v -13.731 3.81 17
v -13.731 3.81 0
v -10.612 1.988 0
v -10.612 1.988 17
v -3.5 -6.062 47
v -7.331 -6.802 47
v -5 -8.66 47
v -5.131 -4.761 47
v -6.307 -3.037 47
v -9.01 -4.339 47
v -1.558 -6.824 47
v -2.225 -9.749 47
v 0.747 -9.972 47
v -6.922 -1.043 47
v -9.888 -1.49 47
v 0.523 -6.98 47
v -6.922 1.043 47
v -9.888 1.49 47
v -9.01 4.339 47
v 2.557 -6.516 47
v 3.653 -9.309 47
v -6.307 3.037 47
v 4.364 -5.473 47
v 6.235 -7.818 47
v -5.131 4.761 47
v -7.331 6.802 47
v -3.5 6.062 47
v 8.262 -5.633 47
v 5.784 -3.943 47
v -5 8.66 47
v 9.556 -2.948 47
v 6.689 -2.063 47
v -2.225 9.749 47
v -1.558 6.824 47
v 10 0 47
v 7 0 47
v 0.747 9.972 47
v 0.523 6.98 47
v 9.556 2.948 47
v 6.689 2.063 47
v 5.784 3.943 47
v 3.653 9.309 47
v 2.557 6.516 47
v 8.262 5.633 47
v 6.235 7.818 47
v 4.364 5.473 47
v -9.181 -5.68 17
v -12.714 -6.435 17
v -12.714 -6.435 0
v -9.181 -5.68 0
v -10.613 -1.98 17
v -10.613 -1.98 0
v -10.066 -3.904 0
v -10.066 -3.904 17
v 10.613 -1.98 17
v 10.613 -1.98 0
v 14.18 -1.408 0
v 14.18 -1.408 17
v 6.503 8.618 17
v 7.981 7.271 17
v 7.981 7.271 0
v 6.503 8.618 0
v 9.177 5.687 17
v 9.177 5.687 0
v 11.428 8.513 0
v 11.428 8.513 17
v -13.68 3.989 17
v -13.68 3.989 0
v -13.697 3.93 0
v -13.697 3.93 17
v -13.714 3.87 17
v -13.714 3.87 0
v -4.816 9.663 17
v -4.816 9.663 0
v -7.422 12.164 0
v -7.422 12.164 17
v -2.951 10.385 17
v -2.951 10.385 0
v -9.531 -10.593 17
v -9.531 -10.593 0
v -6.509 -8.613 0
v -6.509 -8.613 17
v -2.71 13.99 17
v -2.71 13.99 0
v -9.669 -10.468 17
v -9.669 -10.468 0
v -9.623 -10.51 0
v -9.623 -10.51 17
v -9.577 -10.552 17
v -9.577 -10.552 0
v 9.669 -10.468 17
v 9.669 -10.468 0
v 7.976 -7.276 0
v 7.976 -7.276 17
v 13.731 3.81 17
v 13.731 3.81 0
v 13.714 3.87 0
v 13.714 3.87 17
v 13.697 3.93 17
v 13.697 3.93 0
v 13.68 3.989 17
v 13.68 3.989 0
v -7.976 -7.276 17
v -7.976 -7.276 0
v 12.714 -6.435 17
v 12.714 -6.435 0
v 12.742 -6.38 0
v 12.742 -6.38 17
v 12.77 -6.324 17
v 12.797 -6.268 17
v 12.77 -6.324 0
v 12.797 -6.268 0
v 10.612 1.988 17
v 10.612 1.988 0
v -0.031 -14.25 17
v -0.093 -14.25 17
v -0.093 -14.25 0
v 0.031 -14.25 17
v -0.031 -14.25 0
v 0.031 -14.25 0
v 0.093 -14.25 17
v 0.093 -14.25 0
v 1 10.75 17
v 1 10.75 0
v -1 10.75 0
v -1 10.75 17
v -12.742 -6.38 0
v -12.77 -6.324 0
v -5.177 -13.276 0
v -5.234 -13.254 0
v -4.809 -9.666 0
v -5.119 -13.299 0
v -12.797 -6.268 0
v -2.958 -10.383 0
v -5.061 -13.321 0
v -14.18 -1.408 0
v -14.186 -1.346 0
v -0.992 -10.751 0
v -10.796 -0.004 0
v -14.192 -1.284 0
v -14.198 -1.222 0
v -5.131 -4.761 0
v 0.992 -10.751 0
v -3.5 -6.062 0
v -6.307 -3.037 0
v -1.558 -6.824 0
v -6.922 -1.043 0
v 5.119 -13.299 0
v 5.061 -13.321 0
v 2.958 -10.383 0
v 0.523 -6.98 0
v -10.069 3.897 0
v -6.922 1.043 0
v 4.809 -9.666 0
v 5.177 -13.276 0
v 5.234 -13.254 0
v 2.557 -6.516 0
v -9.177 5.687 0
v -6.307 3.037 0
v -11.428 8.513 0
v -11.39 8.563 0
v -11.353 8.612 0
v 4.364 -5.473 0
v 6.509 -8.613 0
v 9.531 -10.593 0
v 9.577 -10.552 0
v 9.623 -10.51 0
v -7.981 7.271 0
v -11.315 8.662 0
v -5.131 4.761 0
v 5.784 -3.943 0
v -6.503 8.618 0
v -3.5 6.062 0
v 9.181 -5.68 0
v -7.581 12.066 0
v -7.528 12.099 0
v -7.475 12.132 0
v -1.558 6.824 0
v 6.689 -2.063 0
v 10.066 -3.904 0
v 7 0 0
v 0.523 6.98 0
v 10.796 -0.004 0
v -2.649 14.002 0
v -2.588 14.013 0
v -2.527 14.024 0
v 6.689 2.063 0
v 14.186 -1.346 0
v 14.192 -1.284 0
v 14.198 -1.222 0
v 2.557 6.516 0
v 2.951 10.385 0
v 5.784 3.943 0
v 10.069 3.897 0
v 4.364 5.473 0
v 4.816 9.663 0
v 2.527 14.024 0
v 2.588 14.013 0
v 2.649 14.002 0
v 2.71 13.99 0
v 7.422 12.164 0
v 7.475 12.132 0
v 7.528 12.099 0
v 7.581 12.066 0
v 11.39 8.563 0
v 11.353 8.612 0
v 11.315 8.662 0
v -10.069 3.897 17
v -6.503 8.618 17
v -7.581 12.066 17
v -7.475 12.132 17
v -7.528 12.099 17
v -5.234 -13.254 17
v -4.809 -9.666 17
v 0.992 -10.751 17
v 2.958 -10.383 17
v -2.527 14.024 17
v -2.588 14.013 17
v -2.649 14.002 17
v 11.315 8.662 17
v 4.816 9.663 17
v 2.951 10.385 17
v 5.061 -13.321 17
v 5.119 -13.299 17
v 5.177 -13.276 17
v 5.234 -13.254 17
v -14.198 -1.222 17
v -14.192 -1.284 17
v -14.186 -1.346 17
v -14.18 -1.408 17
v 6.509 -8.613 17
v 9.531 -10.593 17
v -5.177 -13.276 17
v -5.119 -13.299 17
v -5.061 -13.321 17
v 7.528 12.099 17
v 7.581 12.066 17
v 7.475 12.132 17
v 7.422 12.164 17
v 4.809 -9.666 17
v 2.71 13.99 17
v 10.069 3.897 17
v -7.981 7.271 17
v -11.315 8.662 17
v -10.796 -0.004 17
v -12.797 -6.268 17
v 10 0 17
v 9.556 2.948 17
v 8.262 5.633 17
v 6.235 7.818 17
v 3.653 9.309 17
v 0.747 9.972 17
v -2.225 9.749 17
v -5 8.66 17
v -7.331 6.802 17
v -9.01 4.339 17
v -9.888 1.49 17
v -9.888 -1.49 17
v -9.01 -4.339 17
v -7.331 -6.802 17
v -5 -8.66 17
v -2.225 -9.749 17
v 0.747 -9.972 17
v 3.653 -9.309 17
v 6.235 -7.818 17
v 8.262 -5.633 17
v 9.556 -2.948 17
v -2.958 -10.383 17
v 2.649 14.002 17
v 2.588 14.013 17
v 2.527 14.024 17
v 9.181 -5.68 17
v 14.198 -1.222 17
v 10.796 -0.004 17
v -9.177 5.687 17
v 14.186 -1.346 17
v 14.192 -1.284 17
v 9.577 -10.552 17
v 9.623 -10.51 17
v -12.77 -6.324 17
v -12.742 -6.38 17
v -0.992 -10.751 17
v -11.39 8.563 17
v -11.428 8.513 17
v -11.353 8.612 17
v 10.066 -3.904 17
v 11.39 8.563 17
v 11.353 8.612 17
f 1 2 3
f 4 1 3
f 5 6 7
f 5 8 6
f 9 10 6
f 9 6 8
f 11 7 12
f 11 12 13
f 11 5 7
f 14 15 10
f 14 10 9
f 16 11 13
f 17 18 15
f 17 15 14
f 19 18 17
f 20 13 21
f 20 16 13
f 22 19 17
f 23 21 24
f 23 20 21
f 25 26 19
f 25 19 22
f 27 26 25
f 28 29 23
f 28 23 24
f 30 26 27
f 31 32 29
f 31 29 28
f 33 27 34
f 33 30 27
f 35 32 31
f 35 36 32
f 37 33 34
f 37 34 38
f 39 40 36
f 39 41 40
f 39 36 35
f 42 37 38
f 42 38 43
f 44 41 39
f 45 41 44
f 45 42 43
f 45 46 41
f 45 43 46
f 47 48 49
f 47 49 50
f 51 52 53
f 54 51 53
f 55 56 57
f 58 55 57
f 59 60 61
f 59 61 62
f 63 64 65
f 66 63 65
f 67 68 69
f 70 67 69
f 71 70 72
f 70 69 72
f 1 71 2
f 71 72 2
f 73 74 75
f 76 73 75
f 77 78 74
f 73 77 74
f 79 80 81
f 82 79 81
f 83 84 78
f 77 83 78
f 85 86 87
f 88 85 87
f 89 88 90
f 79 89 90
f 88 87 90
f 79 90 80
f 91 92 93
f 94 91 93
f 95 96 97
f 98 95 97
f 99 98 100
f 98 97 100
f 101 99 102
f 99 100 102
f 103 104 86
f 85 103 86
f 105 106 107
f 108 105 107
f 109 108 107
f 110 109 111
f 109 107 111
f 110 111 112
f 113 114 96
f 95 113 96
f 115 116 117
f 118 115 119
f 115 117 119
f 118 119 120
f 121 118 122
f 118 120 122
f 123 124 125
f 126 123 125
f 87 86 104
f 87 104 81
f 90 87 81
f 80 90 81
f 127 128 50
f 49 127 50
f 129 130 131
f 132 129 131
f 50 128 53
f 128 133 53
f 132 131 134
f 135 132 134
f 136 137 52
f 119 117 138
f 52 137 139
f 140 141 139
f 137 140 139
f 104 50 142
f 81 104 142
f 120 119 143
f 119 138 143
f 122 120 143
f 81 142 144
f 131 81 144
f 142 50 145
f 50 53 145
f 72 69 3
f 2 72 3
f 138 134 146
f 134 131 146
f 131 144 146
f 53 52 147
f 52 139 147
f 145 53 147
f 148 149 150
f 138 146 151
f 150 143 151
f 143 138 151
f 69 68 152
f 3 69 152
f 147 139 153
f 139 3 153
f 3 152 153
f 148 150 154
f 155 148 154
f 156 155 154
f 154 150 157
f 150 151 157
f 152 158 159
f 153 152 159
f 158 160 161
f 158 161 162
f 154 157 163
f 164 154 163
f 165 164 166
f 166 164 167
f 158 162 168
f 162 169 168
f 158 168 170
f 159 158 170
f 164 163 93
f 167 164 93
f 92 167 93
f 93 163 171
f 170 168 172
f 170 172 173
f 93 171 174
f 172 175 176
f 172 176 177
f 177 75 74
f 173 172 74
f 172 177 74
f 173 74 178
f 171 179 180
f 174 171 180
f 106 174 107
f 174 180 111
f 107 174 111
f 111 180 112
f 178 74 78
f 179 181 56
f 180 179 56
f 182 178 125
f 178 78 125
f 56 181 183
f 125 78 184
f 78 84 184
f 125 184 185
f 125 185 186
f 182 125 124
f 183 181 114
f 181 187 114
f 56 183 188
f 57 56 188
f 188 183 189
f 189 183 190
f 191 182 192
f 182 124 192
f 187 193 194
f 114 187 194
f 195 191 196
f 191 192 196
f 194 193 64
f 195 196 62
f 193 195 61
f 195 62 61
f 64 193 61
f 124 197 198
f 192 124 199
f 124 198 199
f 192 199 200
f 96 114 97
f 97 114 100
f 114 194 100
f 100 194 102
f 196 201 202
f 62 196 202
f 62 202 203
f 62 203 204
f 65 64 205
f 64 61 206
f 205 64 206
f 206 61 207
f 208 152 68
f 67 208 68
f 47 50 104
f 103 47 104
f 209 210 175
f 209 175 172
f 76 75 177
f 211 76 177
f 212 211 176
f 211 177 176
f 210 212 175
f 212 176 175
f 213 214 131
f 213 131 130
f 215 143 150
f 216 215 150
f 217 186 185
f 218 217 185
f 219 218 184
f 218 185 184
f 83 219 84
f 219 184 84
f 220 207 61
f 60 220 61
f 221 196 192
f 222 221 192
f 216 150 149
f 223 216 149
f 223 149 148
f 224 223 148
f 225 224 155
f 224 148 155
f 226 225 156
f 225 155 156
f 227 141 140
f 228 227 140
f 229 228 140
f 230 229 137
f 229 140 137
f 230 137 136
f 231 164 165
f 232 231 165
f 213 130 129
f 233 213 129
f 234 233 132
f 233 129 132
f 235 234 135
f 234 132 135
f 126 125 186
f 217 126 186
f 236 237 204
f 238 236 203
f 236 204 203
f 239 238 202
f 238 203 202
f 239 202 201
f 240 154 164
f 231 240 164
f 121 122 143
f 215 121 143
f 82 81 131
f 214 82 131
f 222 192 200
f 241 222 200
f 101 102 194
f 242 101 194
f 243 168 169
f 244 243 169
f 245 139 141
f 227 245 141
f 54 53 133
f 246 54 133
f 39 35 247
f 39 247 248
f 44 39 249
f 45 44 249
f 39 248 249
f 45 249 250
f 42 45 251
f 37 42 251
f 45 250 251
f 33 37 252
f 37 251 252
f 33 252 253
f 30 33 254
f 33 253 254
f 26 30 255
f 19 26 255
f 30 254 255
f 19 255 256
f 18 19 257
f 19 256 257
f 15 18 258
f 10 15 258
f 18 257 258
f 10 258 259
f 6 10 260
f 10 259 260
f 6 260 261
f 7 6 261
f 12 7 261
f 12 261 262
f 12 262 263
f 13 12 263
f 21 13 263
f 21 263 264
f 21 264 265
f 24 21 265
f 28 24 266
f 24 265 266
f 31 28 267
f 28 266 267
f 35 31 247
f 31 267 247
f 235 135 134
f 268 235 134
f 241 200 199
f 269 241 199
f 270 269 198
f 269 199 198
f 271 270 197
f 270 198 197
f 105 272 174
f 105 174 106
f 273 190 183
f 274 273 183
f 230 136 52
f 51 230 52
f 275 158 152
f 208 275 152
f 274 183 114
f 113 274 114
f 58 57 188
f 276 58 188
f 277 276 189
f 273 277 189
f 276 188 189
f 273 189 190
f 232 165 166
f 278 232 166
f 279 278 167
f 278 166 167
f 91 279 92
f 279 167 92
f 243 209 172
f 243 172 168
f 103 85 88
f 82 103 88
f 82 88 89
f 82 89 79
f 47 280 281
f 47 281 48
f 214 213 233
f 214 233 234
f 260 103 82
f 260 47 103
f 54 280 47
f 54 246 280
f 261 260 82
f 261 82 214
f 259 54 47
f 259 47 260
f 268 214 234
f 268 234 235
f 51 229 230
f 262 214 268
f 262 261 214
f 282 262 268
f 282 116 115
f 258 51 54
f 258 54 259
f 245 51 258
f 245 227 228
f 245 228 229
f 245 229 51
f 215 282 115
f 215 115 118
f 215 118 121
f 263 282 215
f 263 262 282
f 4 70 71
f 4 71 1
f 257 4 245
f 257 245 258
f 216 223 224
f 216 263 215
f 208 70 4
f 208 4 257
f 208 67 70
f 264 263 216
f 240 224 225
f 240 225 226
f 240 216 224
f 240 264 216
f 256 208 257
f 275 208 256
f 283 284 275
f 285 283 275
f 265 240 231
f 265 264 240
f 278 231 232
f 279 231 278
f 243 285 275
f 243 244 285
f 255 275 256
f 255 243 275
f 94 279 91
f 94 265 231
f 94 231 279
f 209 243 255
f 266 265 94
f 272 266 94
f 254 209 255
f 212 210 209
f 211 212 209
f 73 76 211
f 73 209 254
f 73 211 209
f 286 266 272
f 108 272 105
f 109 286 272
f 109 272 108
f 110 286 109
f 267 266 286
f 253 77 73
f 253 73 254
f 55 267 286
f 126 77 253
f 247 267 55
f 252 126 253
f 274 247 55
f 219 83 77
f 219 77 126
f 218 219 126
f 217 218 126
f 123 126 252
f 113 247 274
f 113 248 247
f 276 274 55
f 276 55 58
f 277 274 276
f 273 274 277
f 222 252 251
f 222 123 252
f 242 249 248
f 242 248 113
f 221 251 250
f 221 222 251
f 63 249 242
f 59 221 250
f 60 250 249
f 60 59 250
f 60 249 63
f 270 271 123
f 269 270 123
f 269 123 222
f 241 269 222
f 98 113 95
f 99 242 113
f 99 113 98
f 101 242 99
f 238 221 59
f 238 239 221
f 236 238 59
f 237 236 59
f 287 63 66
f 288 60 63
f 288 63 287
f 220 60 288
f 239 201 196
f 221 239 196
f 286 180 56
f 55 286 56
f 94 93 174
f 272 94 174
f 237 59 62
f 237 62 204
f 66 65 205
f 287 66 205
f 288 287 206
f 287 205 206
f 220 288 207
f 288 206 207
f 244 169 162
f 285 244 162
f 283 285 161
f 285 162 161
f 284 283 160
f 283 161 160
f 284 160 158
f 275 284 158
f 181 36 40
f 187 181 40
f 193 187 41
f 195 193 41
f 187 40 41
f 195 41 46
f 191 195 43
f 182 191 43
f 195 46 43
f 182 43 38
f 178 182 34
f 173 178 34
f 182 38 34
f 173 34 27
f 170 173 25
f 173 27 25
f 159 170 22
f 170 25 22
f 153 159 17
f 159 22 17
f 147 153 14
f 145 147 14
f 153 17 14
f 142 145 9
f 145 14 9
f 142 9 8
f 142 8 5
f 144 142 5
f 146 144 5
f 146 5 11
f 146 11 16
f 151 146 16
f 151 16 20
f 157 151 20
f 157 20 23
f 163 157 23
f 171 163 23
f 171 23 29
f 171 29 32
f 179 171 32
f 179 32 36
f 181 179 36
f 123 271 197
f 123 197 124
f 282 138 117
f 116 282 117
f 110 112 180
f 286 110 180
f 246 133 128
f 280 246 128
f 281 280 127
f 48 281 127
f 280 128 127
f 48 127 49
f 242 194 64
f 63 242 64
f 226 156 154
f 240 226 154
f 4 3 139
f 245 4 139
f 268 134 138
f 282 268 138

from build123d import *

# Parameters (mm, degrees)
SKETCH_1_R          = 14.25
EXTRUDE_1_DEPTH     = 17
SKETCH_2_R          = 10
EXTRUDE_2_DEPTH     = 30
CUT_EXTRUDE_1_DEPTH = 52.138292893
SKETCH_4_R          = 7
CUT_EXTRUDE_2_DEPTH = 52.123690078


with BuildPart() as part:
    # 草图1 → 拉伸1 (new body)
    with BuildSketch(Plane.XY):
        Circle(SKETCH_1_R)
    extrude(amount=EXTRUDE_1_DEPTH)

    # 草图2 → 拉伸2 (add)
    with BuildSketch(Plane.XY.offset(17)):
        Circle(SKETCH_2_R)
    extrude(amount=EXTRUDE_2_DEPTH)

    # 草图3 → 切除-拉伸1 (cut, through all)
    with BuildSketch(Plane(origin=(0, 0, 0), x_dir=(-1, 0, 0), z_dir=(0, 0, -1))):
        with BuildLine():
            Line((2.950875682, 10.385318132), (4.815820141, 9.6628348))
            Line((4.815820141, 9.6628348), (7.422273255, 12.164388999))
            ThreePointArc((7.422273255, 12.164388999), (5.147693743, 13.287729269), (2.709969755, 13.989945101))
            Line((2.709969755, 13.989945101), (2.950875682, 10.385318132))
        make_face()
        with BuildLine():
            Line((-1, 10.75), (1, 10.75))
            Line((1, 10.75), (2.526779539, 14.024189287))
            ThreePointArc((2.526779539, 14.024189287), (0, 14.25), (-2.526779539, 14.024189287))
            Line((-2.526779539, 14.024189287), (-1, 10.75))
        make_face()
        with BuildLine():
            Line((6.503219252, 8.618041504), (7.981237086, 7.270650216))
            Line((7.981237086, 7.270650216), (11.315347839, 8.661720572))
            ThreePointArc((11.315347839, 8.661720572), (9.600162922, 10.53087707), (7.580722617, 12.066281308))
            Line((7.580722617, 12.066281308), (6.503219252, 8.618041504))
        make_face()
        with BuildLine():
            Line((9.177267026, 5.686850616), (10.068743738, 3.896524033))
            Line((10.068743738, 3.896524033), (13.680221998, 3.989238785))
            ThreePointArc((13.680221998, 3.989238785), (12.756076902, 6.35177157), (11.427656884, 8.512999362))
            Line((11.427656884, 8.512999362), (9.177267026, 5.686850616))
        make_face()
        with BuildLine():
            Line((10.611874036, 1.987619041), (10.796410755, -0.003849312))
            Line((10.796410755, -0.003849312), (14.197506371, -1.222011804))
            ThreePointArc((14.197506371, -1.222011804), (14.189212012, 1.314824122), (13.731222765, 3.809989681))
            Line((13.731222765, 3.809989681), (10.611874036, 1.987619041))
        make_face()
        with BuildLine():
            Line((10.613288654, -1.9800515), (10.065962674, -3.903702786))
            Line((10.065962674, -3.903702786), (12.797338837, -6.268222929))
            ThreePointArc((12.797338837, -6.268222929), (13.706015415, -3.899697609), (14.180310925, -1.407580219))
            Line((14.180310925, -1.407580219), (10.613288654, -1.9800515))
        make_face()
        with BuildLine():
            Line((9.18131983, -5.680305114), (7.976050557, -7.276339568))
            Line((7.976050557, -7.276339568), (9.668819781, -10.467875813))
            ThreePointArc((9.668819781, -10.467875813), (11.371745489, -8.587543568), (12.714269518, -6.43504861))
            Line((12.714269518, -6.43504861), (9.18131983, -5.680305114))
        make_face()
        with BuildLine():
            Line((6.509362887, -8.613402046), (4.808928615, -9.666266372))
            Line((4.808928615, -9.666266372), (5.234473037, -13.253784064))
            ThreePointArc((5.234473037, -13.253784064), (7.501658321, -12.115594184), (9.531095561, -10.593428029))
            Line((9.531095561, -10.593428029), (6.509362887, -8.613402046))
        make_face()
        with BuildLine():
            Line((2.958280416, -10.383211304), (0.992334217, -10.750710339))
            Line((0.992334217, -10.750710339), (0.093181704, -14.249695336))
            ThreePointArc((0.093181704, -14.249695336), (2.618430629, -14.00736667), (5.060694335, -13.321106292))
            Line((5.060694335, -13.321106292), (2.958280416, -10.383211304))
        make_face()
        with BuildLine():
            Line((-0.992334217, -10.750710339), (-2.958280416, -10.383211304))
            Line((-2.958280416, -10.383211304), (-5.060694335, -13.321106292))
            ThreePointArc((-5.060694335, -13.321106292), (-2.618430629, -14.00736667), (-0.093181704, -14.249695336))
            Line((-0.093181704, -14.249695336), (-0.992334217, -10.750710339))
        make_face()
        with BuildLine():
            Line((-4.808928615, -9.666266372), (-6.509362887, -8.613402046))
            Line((-6.509362887, -8.613402046), (-9.531095561, -10.593428029))
            ThreePointArc((-9.531095561, -10.593428029), (-7.501658321, -12.115594184), (-5.234473037, -13.253784064))
            Line((-5.234473037, -13.253784064), (-4.808928615, -9.666266372))
        make_face()
        with BuildLine():
            Line((-7.976050557, -7.276339568), (-9.18131983, -5.680305114))
            Line((-9.18131983, -5.680305114), (-12.714269518, -6.43504861))
            ThreePointArc((-12.714269518, -6.43504861), (-11.371745489, -8.587543568), (-9.668819781, -10.467875813))
            Line((-9.668819781, -10.467875813), (-7.976050557, -7.276339568))
        make_face()
        with BuildLine():
            Line((-10.065962674, -3.903702786), (-10.613288654, -1.9800515))
            Line((-10.613288654, -1.9800515), (-14.180310925, -1.407580219))
            ThreePointArc((-14.180310925, -1.407580219), (-13.706015415, -3.899697609), (-12.797338837, -6.268222929))
            Line((-12.797338837, -6.268222929), (-10.065962674, -3.903702786))
        make_face()
        with BuildLine():
            Line((-10.796410755, -0.003849312), (-10.611874036, 1.987619041))
            Line((-10.611874036, 1.987619041), (-13.731222765, 3.809989681))
            ThreePointArc((-13.731222765, 3.809989681), (-14.189212012, 1.314824122), (-14.197506371, -1.222011804))
            Line((-14.197506371, -1.222011804), (-10.796410755, -0.003849312))
        make_face()
        with BuildLine():
            Line((-10.068743738, 3.896524033), (-9.177267026, 5.686850616))
            Line((-9.177267026, 5.686850616), (-11.427656884, 8.512999362))
            ThreePointArc((-11.427656884, 8.512999362), (-12.756076902, 6.35177157), (-13.680221998, 3.989238785))
            Line((-13.680221998, 3.989238785), (-10.068743738, 3.896524033))
        make_face()
        with BuildLine():
            Line((-7.981237086, 7.270650216), (-6.503219252, 8.618041504))
            Line((-6.503219252, 8.618041504), (-7.580722617, 12.066281308))
            ThreePointArc((-7.580722617, 12.066281308), (-9.600162922, 10.53087707), (-11.315347839, 8.661720572))
            Line((-11.315347839, 8.661720572), (-7.981237086, 7.270650216))
        make_face()
        with BuildLine():
            Line((-4.815820141, 9.6628348), (-2.950875682, 10.385318132))
            Line((-2.950875682, 10.385318132), (-2.709969755, 13.989945101))
            ThreePointArc((-2.709969755, 13.989945101), (-5.147693743, 13.287729269), (-7.422273255, 12.164388999))
            Line((-7.422273255, 12.164388999), (-4.815820141, 9.6628348))
        make_face()
    extrude(amount=-CUT_EXTRUDE_1_DEPTH, mode=Mode.SUBTRACT)

    # 草图4 → 切除-拉伸2 (cut, through all)
    with BuildSketch(Plane.XY.offset(47)):
        Circle(SKETCH_4_R)
    extrude(amount=-CUT_EXTRUDE_2_DEPTH, mode=Mode.SUBTRACT)


solid = part.part
